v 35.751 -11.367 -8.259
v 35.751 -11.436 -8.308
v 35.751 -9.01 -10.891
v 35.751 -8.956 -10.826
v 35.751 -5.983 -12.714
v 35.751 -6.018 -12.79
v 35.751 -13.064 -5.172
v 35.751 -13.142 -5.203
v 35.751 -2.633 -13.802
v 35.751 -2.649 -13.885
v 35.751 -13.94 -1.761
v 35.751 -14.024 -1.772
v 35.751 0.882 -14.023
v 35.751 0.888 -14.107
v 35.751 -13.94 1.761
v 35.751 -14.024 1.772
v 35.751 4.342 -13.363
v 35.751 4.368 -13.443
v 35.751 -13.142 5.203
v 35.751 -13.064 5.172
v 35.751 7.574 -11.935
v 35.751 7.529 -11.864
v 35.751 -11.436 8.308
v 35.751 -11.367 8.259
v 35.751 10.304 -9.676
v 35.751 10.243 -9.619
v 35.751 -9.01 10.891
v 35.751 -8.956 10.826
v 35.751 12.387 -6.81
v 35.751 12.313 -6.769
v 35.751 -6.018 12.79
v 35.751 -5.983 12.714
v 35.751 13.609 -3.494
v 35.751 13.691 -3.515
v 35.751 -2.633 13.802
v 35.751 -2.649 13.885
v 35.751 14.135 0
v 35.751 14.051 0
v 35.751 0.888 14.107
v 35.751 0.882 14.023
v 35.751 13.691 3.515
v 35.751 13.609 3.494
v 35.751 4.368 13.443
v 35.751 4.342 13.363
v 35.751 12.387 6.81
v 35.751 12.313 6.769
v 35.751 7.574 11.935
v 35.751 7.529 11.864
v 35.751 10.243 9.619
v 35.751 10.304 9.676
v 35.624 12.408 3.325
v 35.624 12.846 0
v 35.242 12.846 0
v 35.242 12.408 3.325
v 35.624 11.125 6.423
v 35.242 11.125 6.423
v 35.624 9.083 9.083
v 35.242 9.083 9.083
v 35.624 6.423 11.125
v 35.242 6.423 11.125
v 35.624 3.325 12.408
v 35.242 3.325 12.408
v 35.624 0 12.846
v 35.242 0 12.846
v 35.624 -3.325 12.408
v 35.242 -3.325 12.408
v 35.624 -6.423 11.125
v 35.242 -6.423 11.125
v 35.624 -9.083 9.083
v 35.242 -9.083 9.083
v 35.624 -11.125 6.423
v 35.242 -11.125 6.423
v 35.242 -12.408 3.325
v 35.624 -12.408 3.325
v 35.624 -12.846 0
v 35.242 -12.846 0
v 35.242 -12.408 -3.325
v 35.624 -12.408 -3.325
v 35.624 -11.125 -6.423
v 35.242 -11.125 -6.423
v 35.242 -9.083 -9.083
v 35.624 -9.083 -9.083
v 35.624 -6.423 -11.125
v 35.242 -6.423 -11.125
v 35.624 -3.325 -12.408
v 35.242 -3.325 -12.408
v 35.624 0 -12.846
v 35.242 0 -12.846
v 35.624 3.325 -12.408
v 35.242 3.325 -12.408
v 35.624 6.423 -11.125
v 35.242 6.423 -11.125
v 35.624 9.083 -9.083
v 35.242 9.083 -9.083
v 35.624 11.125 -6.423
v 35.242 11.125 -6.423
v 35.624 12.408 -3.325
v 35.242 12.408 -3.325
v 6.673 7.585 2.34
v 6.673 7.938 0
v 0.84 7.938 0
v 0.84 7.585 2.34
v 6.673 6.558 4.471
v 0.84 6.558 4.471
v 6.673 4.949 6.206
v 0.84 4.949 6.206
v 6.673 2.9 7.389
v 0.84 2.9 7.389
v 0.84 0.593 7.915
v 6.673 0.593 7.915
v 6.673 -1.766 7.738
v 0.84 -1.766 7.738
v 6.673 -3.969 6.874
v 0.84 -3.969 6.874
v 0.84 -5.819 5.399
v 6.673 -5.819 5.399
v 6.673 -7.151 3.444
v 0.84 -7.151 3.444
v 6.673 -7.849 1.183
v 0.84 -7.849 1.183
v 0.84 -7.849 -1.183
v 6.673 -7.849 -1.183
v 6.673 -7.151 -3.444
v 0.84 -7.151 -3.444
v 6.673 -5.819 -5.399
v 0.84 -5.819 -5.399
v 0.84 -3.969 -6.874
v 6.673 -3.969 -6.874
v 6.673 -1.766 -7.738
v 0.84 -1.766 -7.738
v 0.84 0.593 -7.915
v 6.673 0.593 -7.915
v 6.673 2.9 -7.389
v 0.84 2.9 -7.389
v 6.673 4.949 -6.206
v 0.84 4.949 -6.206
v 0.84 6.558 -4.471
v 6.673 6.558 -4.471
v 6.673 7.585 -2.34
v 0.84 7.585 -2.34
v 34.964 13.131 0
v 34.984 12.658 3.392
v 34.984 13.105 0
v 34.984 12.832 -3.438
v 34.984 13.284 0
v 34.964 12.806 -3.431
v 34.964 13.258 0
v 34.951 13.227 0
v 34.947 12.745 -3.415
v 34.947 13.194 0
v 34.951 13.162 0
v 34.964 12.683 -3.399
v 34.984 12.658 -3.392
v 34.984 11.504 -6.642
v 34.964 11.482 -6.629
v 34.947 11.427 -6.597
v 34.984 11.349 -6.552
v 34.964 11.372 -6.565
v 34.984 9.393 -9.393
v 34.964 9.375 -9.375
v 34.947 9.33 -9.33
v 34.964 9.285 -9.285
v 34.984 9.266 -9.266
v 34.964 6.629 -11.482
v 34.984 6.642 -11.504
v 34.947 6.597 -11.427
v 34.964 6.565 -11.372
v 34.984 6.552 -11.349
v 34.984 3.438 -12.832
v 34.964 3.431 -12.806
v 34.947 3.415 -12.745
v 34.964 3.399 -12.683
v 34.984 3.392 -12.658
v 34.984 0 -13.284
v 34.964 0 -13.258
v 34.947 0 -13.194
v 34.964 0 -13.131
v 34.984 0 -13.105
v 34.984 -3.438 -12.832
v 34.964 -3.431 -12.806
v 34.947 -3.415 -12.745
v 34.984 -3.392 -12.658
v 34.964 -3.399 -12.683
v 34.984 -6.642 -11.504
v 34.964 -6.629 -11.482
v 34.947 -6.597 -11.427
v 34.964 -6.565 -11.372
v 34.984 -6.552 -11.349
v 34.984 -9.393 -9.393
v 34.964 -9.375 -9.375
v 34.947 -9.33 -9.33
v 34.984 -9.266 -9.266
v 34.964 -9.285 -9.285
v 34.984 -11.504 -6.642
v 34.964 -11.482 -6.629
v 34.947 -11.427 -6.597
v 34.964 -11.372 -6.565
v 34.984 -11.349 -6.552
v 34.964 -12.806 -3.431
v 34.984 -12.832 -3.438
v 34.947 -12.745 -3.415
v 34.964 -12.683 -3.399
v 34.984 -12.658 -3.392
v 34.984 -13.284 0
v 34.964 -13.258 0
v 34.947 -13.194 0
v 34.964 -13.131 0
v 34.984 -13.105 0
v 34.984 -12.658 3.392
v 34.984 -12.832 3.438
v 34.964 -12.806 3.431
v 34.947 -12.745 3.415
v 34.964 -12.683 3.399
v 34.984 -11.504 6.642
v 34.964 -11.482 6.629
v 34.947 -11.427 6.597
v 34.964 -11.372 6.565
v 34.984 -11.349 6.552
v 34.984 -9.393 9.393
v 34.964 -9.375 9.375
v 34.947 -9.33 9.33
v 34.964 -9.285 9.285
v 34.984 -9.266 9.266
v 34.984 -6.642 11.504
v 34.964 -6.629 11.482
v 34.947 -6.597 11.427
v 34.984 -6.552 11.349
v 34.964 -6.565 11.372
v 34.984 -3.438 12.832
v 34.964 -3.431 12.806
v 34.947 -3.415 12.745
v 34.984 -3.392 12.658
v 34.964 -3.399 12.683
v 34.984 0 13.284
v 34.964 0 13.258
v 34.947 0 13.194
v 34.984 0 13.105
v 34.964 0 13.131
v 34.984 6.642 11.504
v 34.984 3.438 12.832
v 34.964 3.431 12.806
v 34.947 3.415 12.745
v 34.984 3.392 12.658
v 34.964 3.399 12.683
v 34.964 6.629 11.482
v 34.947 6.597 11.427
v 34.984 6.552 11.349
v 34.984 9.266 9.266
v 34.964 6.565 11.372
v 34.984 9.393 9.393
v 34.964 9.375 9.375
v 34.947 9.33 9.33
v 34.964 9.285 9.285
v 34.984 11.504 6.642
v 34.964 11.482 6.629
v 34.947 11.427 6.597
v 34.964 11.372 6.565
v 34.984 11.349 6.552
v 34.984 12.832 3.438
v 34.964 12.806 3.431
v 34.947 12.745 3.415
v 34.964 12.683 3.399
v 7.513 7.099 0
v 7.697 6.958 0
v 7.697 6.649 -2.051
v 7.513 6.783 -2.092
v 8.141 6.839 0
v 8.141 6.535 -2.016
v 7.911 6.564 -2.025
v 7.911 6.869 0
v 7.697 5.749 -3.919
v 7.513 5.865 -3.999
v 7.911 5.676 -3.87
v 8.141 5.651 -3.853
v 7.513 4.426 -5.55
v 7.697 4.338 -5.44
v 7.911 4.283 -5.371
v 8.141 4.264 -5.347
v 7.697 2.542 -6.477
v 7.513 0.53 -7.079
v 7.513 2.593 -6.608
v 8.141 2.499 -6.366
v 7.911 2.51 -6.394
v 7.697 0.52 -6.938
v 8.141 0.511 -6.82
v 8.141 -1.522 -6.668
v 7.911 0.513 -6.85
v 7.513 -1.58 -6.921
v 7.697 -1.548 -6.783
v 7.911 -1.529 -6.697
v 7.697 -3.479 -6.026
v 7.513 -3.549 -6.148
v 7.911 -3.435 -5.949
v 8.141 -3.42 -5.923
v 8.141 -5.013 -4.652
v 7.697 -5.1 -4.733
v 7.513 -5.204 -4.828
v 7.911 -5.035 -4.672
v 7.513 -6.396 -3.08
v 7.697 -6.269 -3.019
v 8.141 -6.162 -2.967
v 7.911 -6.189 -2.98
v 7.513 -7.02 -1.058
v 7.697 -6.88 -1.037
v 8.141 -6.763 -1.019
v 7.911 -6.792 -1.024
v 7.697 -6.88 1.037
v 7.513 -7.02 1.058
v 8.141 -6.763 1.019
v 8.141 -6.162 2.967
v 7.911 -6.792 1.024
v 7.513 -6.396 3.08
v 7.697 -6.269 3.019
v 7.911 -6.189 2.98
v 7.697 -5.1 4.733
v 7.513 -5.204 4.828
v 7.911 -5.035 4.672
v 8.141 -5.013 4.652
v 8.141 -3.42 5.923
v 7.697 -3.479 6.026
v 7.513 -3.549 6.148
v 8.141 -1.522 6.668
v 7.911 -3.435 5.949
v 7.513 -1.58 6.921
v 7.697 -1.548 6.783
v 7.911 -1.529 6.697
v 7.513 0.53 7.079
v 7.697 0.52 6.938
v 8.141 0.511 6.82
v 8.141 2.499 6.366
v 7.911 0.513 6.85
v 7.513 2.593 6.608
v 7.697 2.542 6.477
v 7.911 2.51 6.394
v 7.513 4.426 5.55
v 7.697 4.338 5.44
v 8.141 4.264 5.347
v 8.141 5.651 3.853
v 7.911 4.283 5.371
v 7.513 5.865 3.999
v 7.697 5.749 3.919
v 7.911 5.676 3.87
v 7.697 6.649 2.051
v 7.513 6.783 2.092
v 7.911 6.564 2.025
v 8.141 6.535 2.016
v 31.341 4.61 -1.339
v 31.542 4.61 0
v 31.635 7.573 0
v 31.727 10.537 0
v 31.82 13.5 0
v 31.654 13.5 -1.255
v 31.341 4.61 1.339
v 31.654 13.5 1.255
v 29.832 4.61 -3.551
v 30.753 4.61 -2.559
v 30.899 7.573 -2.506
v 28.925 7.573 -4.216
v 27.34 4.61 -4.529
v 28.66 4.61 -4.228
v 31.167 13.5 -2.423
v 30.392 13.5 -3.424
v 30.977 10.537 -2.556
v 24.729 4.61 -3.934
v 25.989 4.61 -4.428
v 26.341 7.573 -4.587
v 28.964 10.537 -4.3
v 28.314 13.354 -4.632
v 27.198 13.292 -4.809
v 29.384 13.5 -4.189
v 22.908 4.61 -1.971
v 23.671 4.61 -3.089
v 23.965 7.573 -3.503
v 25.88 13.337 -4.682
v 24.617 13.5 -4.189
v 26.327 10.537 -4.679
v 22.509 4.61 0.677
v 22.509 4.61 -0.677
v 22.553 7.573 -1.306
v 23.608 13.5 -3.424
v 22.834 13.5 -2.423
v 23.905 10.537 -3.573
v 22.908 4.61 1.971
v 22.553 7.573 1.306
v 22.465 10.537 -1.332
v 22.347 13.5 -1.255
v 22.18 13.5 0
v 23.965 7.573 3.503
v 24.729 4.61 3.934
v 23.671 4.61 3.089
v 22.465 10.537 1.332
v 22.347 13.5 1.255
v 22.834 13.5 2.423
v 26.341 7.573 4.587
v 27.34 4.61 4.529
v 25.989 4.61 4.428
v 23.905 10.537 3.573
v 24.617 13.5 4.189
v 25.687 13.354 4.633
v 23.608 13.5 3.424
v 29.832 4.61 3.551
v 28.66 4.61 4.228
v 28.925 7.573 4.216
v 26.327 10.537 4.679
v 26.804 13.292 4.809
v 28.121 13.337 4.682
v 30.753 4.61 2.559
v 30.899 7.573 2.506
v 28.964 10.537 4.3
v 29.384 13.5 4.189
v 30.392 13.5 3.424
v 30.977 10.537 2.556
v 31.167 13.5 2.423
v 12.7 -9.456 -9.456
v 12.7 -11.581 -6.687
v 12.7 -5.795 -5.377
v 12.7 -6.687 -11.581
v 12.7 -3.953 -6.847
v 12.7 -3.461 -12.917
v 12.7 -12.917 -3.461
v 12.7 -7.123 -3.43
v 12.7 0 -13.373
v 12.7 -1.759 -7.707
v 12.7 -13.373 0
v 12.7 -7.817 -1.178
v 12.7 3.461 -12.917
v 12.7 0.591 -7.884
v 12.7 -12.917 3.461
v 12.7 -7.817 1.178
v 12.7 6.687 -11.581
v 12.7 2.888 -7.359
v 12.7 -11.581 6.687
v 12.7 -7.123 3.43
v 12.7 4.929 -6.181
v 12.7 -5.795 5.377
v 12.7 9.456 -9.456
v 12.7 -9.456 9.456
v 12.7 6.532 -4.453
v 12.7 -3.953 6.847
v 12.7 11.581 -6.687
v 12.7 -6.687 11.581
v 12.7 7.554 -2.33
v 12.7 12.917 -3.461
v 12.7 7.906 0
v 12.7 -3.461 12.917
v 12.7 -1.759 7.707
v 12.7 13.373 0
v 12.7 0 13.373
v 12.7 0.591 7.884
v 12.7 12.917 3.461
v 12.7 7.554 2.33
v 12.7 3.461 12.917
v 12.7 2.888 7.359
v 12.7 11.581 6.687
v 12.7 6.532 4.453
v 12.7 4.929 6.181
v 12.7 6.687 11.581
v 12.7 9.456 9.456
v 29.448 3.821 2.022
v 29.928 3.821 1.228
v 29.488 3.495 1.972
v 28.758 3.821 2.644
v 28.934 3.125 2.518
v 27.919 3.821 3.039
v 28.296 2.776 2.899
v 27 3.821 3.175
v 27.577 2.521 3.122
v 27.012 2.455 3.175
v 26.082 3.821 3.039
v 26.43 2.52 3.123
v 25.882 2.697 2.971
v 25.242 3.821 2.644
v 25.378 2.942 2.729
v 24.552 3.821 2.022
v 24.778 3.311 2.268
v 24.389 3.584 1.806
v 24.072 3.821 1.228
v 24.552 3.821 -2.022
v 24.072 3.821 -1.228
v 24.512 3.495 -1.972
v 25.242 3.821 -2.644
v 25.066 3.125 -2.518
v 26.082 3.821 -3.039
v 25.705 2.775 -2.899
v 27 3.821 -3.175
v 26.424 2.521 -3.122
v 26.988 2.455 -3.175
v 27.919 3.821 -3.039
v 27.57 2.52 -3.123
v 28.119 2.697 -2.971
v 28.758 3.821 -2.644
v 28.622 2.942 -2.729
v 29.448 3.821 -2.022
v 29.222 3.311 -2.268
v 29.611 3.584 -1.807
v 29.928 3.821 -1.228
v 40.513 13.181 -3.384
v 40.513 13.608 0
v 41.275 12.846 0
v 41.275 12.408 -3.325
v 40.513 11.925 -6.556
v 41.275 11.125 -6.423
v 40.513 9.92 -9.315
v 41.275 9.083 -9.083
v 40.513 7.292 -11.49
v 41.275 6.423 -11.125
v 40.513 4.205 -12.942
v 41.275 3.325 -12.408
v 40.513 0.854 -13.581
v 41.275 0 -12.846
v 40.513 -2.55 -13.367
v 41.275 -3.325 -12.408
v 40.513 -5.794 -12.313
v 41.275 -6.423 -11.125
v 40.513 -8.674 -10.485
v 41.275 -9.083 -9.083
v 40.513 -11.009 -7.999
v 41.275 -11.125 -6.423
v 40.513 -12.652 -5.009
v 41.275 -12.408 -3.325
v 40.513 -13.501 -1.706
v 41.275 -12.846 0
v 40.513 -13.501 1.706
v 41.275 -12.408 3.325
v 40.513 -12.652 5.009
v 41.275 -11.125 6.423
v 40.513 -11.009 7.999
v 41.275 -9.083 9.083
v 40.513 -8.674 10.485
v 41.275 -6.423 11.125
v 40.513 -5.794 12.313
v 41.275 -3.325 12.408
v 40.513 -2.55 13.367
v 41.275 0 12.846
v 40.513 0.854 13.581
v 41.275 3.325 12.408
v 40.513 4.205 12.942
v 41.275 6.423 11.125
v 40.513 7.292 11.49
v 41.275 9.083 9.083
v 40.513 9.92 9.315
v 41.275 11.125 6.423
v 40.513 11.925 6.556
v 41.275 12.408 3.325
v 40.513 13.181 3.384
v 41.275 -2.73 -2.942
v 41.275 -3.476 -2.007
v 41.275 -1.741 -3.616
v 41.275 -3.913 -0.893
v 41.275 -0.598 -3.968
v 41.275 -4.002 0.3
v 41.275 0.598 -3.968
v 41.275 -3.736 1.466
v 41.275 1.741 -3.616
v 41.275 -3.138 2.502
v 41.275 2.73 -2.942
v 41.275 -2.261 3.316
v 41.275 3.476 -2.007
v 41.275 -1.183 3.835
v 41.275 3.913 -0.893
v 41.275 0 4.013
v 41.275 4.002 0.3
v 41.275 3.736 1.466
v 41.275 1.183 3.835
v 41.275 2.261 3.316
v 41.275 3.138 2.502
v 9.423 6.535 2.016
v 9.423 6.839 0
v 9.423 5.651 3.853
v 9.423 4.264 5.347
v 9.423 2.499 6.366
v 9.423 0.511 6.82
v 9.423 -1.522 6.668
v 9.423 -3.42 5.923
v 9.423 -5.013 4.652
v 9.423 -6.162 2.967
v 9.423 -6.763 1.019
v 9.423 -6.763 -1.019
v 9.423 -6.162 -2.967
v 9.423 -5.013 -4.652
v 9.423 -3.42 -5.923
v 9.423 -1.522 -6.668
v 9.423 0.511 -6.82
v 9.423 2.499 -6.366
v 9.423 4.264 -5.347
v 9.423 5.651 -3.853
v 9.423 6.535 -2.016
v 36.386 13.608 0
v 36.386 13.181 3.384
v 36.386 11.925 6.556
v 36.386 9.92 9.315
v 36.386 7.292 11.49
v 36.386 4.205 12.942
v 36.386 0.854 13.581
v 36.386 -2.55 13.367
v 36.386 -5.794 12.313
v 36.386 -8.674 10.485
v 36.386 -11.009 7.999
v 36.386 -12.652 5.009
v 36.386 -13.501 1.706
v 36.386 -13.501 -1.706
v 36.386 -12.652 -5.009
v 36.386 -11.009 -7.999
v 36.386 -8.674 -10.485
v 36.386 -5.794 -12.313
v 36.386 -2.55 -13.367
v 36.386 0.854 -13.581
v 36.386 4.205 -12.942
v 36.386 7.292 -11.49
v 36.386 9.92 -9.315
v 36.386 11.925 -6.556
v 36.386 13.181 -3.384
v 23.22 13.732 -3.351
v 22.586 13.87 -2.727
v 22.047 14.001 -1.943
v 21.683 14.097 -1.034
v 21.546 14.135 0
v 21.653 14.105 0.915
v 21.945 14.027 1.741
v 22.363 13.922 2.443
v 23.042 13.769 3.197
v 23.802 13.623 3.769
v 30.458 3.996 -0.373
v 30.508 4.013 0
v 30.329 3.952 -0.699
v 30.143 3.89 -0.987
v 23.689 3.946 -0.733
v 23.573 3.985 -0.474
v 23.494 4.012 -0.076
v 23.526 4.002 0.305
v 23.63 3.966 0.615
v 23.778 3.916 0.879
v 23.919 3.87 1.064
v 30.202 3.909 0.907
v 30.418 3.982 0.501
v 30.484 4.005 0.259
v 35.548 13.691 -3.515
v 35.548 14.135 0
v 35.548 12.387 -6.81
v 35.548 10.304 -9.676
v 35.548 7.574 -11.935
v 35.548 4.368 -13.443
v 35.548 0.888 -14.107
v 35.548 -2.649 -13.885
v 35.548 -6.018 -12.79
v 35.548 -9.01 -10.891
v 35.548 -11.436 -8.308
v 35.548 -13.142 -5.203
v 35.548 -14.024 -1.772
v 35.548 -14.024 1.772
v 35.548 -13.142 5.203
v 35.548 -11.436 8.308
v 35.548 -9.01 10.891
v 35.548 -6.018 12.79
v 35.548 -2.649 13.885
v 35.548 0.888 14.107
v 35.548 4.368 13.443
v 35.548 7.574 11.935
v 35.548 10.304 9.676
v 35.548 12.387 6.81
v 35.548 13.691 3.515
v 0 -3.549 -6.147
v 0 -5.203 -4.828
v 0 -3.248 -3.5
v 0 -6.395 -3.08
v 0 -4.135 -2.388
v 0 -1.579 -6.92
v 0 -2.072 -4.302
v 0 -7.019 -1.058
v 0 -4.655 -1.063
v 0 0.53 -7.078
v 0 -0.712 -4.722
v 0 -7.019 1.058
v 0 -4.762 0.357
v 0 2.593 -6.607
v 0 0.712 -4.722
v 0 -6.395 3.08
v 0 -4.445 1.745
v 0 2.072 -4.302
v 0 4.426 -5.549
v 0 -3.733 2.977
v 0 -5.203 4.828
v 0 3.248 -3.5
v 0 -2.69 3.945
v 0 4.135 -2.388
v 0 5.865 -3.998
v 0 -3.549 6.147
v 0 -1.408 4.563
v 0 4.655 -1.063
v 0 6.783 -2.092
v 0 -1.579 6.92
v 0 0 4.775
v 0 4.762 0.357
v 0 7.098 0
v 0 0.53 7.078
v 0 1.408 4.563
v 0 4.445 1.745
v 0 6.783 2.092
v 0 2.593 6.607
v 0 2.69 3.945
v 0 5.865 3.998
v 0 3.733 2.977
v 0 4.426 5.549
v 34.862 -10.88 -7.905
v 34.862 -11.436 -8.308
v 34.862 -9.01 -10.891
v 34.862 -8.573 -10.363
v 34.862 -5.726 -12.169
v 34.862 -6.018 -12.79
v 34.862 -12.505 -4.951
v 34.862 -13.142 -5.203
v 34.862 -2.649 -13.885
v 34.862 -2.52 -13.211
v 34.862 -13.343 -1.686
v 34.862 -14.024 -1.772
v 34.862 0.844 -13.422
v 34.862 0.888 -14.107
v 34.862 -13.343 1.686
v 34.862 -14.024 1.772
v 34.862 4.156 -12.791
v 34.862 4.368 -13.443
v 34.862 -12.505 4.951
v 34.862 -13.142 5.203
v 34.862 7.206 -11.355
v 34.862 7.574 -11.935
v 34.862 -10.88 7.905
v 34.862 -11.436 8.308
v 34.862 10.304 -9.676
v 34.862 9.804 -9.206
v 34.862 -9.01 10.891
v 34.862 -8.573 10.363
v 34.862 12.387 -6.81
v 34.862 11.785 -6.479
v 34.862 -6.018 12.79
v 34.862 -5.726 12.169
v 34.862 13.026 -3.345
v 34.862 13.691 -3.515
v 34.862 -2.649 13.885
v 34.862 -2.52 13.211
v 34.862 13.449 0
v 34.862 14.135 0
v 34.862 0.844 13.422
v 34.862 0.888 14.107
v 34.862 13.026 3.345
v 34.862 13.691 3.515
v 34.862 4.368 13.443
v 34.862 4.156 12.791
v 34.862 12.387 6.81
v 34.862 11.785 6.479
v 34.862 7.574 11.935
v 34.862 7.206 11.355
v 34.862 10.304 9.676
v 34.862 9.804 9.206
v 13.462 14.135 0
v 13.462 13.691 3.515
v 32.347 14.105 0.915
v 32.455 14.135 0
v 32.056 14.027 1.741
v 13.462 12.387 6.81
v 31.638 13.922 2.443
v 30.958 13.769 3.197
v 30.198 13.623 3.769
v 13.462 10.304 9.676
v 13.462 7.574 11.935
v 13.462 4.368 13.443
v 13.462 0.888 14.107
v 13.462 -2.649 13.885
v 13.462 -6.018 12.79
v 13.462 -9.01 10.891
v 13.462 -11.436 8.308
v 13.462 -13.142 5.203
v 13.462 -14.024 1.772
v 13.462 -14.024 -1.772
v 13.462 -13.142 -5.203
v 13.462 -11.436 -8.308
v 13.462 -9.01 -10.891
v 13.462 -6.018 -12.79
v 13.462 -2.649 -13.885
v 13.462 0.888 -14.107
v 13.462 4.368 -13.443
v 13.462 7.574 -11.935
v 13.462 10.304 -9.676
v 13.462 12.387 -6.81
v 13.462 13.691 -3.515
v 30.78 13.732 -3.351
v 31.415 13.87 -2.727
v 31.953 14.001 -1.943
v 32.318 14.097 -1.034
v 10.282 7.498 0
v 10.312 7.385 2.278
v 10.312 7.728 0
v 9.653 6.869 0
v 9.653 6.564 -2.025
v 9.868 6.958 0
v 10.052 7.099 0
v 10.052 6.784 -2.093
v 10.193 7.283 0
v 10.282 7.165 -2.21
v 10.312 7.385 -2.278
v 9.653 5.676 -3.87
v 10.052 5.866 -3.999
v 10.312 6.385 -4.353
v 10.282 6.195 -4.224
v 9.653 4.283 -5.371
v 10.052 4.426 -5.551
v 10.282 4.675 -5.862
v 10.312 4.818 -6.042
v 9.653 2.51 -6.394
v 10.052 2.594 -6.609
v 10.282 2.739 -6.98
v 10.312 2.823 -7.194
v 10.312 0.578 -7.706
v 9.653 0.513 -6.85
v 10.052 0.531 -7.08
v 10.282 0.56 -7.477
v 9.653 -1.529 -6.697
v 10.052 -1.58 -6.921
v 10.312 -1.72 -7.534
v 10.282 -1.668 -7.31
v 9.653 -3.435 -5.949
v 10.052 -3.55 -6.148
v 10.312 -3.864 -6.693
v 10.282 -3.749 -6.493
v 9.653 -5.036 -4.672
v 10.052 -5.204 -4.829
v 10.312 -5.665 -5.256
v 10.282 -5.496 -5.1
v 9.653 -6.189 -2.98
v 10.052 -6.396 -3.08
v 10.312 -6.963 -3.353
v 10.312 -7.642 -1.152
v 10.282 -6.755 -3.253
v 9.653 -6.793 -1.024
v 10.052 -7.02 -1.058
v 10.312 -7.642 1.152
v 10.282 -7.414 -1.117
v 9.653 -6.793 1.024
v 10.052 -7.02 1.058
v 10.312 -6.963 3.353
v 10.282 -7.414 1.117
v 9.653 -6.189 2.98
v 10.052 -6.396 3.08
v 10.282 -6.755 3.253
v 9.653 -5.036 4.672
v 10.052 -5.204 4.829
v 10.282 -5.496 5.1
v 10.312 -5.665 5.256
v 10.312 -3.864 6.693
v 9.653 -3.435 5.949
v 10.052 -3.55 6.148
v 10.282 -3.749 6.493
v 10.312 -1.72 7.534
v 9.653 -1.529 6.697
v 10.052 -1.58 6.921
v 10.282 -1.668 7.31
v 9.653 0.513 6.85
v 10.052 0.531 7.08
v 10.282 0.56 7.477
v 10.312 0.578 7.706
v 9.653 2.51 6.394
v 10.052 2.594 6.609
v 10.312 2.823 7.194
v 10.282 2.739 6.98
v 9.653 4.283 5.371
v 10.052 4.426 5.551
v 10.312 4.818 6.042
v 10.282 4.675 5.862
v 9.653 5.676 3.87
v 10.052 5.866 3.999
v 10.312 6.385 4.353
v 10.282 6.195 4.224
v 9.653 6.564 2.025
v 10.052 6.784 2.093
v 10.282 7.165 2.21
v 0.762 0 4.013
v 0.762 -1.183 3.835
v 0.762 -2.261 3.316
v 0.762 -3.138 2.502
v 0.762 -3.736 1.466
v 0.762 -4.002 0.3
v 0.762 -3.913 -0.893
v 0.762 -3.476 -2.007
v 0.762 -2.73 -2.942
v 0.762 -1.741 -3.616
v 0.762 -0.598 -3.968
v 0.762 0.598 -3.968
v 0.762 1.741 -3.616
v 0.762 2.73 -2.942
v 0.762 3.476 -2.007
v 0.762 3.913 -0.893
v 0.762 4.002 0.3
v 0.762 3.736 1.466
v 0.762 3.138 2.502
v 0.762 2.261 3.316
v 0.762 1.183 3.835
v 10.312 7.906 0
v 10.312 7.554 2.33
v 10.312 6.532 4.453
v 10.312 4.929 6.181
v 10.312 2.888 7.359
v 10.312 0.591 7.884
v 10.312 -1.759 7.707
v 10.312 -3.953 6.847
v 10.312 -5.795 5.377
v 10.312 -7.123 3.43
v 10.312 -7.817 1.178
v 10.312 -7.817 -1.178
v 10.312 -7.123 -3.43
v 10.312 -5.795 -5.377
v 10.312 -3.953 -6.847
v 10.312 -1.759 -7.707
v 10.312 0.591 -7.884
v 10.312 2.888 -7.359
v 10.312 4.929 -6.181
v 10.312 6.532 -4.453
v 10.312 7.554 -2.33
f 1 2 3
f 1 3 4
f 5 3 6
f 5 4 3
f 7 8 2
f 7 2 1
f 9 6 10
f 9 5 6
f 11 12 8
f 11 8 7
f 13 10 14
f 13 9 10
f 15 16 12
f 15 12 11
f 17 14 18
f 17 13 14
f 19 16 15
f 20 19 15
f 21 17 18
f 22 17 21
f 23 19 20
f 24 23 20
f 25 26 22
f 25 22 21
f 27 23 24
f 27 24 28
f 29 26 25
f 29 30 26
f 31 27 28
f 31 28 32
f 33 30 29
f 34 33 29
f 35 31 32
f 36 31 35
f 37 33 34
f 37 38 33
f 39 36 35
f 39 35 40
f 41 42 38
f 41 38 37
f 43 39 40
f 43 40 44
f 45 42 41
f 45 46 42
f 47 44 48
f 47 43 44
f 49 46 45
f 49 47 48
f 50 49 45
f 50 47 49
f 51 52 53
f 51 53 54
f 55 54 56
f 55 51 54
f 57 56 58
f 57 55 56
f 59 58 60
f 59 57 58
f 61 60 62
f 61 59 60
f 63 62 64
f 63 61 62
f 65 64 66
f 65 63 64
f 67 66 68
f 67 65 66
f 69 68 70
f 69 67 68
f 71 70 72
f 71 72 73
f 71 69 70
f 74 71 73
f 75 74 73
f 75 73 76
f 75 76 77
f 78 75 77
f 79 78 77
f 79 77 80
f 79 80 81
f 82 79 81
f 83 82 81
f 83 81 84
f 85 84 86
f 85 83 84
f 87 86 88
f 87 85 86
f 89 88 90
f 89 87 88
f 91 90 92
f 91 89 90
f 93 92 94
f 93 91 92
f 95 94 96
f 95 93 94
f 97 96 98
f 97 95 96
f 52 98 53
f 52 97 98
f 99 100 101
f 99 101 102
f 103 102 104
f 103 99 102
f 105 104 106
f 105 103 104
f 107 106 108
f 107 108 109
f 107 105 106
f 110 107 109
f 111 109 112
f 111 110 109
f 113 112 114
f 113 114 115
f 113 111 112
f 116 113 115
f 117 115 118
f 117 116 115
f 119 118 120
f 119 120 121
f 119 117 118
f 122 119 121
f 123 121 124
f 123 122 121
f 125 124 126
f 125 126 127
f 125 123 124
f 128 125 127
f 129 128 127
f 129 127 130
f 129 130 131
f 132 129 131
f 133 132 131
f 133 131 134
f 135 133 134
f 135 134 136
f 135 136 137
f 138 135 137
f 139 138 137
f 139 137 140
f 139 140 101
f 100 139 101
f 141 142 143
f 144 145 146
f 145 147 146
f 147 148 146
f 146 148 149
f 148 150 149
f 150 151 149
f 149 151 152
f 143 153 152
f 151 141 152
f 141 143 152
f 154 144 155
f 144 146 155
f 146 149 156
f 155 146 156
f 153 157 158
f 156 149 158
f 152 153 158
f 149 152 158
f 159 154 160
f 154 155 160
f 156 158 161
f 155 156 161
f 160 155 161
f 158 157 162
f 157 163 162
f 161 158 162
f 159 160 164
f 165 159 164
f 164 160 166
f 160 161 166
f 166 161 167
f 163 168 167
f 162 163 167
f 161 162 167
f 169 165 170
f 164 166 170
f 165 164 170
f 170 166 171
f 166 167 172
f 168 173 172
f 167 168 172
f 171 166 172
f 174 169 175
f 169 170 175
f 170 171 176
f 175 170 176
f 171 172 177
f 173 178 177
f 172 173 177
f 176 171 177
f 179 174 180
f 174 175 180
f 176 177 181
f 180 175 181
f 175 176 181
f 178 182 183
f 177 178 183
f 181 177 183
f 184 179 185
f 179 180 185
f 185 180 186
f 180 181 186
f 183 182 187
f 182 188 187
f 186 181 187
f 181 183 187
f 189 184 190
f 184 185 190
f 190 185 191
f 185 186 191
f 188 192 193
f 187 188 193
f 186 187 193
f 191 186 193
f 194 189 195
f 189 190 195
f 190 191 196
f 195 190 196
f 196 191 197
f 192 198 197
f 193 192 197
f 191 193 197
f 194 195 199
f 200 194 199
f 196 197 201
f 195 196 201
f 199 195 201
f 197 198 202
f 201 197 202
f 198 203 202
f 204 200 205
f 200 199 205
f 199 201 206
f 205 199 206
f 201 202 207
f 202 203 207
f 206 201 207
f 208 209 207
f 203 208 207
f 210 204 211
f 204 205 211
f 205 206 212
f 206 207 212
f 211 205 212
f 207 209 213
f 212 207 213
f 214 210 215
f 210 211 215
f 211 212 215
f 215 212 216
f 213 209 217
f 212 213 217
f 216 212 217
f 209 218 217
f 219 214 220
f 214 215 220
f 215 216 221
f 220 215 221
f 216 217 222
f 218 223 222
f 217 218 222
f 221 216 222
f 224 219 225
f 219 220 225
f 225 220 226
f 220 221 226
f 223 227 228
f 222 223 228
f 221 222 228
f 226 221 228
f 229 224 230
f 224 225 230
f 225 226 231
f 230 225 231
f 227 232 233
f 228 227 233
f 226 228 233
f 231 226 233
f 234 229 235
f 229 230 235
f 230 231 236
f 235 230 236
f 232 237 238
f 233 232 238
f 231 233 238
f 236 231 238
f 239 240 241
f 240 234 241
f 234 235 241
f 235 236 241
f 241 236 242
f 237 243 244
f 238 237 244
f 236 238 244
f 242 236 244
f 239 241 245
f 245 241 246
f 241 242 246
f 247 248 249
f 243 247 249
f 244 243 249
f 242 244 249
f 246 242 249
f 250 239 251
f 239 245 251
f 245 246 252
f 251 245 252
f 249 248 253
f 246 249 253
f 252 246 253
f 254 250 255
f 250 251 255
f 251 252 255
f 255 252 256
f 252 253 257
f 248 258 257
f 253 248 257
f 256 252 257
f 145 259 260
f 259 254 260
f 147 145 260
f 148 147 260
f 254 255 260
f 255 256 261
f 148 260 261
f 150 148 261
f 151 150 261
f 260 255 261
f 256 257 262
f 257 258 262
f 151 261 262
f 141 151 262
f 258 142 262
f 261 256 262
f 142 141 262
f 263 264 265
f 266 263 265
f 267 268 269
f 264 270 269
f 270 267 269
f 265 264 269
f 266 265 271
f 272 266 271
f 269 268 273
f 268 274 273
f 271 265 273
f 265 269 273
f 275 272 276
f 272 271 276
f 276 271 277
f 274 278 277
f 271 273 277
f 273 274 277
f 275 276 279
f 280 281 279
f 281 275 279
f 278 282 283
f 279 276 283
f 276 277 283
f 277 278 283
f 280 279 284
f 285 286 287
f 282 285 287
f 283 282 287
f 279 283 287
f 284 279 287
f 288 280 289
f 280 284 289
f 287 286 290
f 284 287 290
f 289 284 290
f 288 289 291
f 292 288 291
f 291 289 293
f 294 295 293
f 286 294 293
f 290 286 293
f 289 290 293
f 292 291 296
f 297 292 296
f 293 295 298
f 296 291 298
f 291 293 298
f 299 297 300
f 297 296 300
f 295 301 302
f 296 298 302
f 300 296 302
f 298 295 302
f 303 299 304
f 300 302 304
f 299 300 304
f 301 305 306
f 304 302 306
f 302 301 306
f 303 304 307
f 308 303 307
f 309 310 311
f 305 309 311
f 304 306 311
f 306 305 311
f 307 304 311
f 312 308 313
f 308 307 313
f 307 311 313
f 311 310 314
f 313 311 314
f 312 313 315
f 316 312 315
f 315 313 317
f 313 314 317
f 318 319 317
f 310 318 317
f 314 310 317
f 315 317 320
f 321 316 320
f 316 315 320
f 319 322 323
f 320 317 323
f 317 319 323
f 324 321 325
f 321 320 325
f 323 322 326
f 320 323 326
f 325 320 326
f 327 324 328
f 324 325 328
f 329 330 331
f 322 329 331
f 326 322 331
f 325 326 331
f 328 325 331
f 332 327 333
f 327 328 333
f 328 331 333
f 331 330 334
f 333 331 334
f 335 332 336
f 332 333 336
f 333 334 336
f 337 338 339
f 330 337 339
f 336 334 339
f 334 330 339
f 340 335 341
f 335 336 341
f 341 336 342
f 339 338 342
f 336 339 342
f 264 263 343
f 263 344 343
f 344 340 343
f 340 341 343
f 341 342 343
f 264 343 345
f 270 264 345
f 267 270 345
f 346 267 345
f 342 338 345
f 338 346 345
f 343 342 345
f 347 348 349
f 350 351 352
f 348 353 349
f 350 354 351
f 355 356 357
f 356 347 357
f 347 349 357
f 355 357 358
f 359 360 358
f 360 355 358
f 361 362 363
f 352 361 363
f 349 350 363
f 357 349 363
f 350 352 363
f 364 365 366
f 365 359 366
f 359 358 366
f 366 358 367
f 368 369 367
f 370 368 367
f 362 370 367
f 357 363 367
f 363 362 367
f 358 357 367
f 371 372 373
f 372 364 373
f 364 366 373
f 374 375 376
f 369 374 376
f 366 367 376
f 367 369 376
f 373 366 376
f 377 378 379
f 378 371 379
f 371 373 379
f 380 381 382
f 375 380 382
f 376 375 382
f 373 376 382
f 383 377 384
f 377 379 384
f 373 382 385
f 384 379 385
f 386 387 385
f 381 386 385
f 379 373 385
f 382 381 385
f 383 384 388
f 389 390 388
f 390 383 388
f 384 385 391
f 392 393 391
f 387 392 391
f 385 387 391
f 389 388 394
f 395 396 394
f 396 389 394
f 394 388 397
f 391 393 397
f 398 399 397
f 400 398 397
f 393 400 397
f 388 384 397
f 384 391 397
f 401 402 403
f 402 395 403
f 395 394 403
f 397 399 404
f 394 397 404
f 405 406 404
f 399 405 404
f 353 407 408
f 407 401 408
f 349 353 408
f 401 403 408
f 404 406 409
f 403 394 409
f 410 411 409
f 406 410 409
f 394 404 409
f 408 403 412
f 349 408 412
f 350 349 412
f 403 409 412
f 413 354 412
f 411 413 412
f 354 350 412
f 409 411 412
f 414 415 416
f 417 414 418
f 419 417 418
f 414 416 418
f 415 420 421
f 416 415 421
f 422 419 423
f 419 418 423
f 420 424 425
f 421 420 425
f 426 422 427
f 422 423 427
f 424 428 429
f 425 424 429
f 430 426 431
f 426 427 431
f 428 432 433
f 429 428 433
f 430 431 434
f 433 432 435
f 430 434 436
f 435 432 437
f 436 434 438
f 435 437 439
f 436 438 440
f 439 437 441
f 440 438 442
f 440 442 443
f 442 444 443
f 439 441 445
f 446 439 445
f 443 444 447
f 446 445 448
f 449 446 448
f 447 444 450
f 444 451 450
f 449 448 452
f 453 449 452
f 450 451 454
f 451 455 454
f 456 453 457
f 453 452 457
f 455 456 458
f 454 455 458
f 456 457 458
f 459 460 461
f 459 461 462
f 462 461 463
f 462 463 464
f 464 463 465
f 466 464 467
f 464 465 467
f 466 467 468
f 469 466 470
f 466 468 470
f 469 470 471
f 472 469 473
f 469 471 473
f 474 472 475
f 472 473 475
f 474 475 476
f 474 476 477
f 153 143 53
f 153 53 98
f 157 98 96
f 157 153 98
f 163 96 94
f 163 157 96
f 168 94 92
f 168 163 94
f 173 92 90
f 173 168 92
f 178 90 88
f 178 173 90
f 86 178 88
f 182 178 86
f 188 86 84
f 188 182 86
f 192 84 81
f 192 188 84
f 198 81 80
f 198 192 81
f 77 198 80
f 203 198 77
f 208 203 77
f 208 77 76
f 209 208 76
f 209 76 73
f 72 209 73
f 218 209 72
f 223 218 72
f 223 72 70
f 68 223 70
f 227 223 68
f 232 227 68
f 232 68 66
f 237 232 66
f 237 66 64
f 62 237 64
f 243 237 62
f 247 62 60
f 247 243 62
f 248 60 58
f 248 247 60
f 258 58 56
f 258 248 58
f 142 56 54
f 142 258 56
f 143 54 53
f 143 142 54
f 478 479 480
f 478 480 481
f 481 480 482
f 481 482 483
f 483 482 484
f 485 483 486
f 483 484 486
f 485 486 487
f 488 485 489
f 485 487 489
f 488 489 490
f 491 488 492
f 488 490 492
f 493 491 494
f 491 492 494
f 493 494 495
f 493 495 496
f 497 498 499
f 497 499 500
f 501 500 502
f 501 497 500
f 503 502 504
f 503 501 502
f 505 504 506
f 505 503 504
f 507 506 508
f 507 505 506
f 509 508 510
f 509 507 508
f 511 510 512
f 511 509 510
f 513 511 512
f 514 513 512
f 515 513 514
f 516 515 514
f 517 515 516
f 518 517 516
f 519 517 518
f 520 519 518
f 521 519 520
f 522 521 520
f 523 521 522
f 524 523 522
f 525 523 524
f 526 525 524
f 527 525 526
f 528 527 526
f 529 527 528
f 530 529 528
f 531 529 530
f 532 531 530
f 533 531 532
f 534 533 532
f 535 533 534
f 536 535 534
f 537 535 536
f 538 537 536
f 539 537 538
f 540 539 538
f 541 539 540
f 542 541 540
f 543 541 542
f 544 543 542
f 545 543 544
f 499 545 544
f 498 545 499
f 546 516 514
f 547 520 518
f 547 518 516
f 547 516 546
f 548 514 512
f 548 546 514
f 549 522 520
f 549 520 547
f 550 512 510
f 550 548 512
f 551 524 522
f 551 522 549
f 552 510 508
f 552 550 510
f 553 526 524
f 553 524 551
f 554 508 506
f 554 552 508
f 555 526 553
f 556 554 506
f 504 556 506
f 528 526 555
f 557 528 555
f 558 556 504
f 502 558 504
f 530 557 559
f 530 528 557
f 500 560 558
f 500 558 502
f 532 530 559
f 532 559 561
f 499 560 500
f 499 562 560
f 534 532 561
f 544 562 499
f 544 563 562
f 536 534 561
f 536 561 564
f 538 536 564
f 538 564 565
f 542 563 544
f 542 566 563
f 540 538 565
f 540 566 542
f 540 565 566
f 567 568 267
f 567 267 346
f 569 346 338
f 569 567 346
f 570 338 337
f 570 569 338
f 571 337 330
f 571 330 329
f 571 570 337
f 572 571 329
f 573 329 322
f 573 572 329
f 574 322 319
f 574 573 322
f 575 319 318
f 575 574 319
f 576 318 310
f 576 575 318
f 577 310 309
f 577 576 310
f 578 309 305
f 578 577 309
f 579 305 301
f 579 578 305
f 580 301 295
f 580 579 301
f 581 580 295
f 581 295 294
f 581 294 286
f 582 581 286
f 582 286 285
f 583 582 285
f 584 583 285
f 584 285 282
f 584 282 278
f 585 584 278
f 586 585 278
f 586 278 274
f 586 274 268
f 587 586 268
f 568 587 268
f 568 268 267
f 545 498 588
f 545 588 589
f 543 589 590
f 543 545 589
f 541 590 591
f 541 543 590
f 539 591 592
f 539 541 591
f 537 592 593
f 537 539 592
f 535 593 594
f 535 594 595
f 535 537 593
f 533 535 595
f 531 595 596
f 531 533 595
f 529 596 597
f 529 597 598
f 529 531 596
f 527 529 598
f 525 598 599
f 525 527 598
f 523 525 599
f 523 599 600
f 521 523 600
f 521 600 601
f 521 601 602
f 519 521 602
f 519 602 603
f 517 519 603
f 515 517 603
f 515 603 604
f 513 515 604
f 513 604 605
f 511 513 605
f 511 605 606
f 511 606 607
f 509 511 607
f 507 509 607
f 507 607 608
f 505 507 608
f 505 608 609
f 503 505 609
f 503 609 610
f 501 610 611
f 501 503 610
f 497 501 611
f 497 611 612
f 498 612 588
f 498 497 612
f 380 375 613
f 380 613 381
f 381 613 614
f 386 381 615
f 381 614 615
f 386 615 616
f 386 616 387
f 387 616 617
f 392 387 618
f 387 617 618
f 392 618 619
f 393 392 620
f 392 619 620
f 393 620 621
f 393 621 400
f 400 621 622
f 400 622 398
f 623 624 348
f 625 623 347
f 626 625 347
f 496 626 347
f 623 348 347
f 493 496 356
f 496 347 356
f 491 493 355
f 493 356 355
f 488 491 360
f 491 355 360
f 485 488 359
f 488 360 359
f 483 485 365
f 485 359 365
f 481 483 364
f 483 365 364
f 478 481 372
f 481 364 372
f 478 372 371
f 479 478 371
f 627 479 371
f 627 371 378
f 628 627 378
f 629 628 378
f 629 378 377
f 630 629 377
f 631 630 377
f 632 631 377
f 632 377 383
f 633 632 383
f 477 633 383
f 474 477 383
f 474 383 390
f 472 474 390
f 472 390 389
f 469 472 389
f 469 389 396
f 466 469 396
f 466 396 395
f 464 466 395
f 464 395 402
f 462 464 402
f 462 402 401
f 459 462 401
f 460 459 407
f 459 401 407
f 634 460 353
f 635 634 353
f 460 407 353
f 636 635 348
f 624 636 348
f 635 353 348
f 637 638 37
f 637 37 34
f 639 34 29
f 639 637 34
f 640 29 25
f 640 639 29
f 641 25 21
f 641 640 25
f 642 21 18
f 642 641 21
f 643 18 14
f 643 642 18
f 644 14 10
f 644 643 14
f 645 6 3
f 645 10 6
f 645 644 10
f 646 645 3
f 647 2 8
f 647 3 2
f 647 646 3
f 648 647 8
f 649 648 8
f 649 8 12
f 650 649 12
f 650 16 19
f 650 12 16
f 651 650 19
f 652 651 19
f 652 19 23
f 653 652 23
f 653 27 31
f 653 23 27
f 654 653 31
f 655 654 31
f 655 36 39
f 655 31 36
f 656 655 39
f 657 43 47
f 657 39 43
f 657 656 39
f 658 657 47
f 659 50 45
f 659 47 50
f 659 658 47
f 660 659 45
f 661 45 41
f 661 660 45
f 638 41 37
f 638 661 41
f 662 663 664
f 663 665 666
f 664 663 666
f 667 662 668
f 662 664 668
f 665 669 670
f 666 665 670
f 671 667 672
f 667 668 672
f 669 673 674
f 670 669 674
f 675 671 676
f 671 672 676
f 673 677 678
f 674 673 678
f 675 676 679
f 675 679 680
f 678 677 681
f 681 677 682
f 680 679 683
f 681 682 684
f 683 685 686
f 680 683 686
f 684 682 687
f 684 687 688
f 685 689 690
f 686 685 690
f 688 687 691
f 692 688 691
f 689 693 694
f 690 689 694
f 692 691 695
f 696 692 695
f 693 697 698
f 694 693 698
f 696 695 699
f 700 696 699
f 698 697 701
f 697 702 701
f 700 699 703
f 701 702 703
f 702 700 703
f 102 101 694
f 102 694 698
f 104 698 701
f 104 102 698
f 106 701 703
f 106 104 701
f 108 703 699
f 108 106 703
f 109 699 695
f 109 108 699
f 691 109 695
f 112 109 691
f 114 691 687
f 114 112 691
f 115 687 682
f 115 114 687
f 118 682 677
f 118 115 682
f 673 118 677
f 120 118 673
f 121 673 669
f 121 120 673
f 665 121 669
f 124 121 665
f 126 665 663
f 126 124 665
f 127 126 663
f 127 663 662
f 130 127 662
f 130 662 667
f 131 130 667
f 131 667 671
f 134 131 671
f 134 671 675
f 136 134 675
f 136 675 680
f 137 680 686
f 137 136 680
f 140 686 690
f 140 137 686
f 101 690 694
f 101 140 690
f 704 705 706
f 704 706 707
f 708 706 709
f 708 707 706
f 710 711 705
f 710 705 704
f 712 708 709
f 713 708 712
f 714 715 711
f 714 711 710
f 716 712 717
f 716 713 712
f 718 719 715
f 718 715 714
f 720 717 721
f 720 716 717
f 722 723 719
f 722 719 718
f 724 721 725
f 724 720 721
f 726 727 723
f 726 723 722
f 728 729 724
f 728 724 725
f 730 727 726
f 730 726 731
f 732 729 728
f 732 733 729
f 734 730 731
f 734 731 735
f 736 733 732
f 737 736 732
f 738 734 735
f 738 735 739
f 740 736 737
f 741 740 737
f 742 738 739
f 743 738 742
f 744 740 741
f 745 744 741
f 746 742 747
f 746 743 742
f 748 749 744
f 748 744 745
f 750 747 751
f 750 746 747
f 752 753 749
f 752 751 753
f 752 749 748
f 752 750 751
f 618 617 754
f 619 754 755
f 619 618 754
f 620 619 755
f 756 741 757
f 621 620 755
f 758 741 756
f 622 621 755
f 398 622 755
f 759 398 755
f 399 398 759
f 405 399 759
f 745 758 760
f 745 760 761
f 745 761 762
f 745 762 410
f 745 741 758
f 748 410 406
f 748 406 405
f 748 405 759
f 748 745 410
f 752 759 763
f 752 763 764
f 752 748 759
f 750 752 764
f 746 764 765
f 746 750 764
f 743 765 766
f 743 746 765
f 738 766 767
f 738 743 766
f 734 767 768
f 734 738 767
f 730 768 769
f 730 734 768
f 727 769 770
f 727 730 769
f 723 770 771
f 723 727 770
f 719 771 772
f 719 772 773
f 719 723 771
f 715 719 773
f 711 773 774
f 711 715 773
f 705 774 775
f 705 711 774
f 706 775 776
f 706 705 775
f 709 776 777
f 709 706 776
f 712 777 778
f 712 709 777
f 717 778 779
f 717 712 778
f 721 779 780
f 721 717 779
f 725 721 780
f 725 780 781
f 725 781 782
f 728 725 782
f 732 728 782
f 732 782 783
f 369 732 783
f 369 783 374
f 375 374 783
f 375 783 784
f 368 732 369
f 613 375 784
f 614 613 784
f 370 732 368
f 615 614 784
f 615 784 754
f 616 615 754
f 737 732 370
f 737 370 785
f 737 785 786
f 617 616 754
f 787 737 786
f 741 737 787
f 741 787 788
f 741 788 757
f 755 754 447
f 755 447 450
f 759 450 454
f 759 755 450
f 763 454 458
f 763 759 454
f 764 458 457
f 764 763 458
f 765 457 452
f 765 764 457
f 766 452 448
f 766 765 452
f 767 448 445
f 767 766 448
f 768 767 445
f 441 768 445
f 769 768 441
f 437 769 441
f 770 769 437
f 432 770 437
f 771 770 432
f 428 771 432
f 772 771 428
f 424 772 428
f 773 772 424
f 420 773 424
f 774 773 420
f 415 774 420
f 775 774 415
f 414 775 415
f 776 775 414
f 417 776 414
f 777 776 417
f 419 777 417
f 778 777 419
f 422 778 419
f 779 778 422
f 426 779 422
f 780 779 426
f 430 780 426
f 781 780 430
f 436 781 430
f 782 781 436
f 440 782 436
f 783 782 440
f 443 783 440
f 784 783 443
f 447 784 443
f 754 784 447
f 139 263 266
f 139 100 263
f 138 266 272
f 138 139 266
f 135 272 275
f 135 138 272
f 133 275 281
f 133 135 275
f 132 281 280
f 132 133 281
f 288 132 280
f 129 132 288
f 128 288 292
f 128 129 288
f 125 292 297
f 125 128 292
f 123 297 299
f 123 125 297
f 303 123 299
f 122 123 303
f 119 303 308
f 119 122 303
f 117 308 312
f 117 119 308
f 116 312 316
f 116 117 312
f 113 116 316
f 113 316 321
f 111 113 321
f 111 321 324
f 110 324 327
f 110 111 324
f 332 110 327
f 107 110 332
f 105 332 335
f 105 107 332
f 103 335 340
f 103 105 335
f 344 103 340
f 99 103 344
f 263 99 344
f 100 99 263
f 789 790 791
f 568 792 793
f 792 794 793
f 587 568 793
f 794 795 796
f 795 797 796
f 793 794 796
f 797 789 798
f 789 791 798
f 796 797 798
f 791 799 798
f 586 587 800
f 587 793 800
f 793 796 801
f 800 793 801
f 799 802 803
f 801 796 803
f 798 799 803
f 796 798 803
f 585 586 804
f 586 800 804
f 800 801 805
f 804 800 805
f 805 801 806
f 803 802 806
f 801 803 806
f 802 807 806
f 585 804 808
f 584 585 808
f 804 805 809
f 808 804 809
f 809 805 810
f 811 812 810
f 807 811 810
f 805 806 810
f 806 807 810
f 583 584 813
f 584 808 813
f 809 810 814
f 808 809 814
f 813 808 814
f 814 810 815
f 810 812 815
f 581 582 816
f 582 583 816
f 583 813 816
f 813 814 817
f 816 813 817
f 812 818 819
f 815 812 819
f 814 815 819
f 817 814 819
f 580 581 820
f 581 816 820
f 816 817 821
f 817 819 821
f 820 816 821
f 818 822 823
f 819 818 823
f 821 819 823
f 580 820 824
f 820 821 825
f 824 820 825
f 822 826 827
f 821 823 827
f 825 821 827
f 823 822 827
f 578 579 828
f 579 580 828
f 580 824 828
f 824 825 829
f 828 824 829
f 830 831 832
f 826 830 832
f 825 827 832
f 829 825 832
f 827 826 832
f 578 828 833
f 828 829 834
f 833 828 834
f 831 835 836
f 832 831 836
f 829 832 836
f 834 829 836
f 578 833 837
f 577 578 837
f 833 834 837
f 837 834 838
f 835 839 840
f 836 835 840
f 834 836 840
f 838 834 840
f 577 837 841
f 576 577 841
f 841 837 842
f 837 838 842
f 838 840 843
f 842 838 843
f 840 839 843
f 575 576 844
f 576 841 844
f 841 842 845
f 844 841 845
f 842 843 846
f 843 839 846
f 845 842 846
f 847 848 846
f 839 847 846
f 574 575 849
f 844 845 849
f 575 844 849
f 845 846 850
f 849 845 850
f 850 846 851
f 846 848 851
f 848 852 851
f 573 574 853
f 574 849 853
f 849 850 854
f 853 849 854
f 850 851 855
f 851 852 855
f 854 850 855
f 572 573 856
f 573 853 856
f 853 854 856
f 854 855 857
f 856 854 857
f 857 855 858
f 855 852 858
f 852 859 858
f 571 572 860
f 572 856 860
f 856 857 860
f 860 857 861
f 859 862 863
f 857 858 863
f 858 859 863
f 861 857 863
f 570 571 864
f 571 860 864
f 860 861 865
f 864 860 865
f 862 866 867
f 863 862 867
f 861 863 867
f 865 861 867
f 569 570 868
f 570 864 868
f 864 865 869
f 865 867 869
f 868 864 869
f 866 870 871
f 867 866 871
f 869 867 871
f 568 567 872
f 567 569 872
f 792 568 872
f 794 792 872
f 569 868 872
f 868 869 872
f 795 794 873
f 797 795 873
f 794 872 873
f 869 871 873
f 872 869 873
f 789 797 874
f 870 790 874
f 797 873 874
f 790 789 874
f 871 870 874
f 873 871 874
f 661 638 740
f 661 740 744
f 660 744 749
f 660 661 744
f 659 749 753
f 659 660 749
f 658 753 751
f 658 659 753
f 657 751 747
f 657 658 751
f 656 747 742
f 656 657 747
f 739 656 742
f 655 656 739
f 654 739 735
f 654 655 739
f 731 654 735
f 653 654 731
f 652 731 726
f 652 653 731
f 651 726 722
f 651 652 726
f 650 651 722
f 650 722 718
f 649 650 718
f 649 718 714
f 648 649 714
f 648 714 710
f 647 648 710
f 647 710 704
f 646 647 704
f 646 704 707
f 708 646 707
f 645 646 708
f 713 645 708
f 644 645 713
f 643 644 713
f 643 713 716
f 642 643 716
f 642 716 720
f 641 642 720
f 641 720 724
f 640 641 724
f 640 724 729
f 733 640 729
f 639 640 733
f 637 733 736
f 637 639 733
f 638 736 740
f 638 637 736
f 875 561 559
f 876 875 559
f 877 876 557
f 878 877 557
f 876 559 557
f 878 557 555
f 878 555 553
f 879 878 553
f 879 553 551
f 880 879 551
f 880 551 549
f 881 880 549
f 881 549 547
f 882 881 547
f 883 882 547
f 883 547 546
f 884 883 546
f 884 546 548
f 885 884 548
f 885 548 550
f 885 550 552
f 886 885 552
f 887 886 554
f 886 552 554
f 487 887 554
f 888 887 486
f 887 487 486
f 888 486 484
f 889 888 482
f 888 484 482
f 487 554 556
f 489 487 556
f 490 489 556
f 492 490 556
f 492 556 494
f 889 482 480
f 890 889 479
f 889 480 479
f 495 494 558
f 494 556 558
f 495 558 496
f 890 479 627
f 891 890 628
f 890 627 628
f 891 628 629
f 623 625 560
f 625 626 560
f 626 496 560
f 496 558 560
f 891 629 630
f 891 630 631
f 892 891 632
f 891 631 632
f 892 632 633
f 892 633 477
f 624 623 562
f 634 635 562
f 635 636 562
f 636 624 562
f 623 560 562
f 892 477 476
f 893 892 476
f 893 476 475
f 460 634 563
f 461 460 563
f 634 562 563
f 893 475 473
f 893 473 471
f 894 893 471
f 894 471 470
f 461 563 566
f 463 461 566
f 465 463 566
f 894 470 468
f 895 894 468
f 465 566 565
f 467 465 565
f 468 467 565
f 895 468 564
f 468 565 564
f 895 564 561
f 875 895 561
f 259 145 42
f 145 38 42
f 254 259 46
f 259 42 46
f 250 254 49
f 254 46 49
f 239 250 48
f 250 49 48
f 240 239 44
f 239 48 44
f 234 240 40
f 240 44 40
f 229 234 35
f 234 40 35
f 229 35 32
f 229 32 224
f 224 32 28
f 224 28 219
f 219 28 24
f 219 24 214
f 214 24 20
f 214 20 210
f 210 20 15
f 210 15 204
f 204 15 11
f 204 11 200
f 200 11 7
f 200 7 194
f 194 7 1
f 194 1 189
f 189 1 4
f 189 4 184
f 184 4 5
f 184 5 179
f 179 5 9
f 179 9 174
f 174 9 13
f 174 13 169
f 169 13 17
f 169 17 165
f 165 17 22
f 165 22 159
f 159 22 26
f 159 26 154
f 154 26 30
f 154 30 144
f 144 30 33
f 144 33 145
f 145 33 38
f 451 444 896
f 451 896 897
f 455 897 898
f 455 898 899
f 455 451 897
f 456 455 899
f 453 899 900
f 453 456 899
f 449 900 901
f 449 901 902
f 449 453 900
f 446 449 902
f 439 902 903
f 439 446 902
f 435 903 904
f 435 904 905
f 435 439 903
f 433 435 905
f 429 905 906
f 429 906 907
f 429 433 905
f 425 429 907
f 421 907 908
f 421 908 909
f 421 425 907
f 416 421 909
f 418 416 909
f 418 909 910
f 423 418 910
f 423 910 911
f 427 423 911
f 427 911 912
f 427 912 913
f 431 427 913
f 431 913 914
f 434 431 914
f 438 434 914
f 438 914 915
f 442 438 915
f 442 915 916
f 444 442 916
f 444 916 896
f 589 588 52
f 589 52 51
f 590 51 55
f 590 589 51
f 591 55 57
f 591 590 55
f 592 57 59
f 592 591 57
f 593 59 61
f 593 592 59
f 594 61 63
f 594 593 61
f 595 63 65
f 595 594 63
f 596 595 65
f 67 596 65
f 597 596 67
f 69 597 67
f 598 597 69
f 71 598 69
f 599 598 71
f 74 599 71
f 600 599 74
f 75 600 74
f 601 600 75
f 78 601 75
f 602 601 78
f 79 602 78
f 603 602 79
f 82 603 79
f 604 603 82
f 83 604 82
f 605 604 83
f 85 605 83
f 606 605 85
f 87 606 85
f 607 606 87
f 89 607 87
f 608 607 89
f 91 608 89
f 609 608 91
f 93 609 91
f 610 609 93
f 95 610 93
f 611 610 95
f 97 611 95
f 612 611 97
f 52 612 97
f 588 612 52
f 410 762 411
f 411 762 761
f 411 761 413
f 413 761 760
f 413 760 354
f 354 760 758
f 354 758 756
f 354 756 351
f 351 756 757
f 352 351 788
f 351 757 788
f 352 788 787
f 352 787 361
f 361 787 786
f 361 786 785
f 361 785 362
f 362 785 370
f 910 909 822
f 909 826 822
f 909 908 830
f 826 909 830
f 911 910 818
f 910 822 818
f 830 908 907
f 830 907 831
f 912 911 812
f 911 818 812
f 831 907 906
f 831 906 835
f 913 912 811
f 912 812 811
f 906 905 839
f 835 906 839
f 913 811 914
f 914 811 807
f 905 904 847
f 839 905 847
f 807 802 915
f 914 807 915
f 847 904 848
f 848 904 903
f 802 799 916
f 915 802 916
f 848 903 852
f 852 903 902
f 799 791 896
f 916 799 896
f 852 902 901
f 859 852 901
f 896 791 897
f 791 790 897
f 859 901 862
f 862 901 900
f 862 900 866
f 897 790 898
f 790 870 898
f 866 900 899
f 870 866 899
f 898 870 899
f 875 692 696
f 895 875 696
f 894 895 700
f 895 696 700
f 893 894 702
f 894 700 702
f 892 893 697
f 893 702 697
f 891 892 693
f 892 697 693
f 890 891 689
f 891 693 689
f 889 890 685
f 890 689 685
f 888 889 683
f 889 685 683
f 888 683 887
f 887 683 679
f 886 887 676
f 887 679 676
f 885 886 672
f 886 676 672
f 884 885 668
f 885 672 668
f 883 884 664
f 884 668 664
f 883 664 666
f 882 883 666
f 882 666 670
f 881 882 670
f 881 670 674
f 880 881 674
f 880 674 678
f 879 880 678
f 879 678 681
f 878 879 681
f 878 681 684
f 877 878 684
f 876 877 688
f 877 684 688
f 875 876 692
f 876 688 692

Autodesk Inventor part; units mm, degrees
sketch "Sketch_2" plane through (0, 0, 0) normal (0, 0, 1) x (1, 0, 0)
  line L0 (12.7, 0) -> (0, 0)
  line L1 (0, 0) -> (0, 7.098)
  line L2 (0, 7.098) -> (0.8395, 7.9375)
  line L3 (0.8395, 7.9375) -> (6.6726, 7.9375)
  line L4 (6.6726, 7.9375) -> (7.5126, 7.0988)
  arc A0 (7.5126, 7.0988) -> (8.1407, 6.839) centre (8.1407, 7.728) ccw
  line L5 (8.1407, 6.839) -> (9.4234, 6.839)
  arc A1 (9.4234, 6.839) -> (10.3124, 7.7279) centre (9.4234, 7.7279) ccw
  line L6 (10.3124, 7.7279) -> (10.3124, 7.9057)
  line L7 (10.3124, 7.9057) -> (12.7, 7.9057)
  line L8 (12.7, 7.9057) -> (12.7, 0)
  line L9 (12.7, 0) -> (0, 0)
revolve "Revolution1" add sketch "Sketch_2" angle 360 about axis through (12.7, 0, 0) along (1, 0, 0)
thread "Thread1" size "5/8-18 UNF" class "2A" standard "ANSI Unified Screw Threads" full length
sketch "Sketch_3" plane through (0, 0, 0) normal (0, 0, 1) x (1, 0, 0)
  line L0 (41.275, 0) -> (12.7, 0)
  line L1 (12.7, 0) -> (12.7, 13.3731)
  line L2 (12.7, 13.3731) -> (13.462, 14.1351)
  line L3 (13.462, 14.1351) -> (34.8615, 14.1351)
  line L4 (34.8615, 14.1351) -> (34.8615, 12.846)
  line L5 (34.8615, 12.846) -> (35.6235, 12.846)
  line L6 (35.6235, 12.846) -> (36.3855, 13.6081)
  line L7 (36.3855, 13.6081) -> (40.513, 13.6081)
  line L8 (40.513, 13.6081) -> (41.275, 12.846)
  line L9 (41.275, 12.846) -> (41.275, 0)
  line L10 (41.275, 0) -> (12.7, 0)
revolve "Revolution2" add sketch "Sketch_3" angle 360 about axis through (41.275, 0, 0) along (1, 0, 0)
sketch "Sketch3" plane through (0, 0, 0) normal (-1, 0, 0) x (0, 0, 1)
  point P0 (0, 0)
hole "Hole1" at (0, 0, 0) direction (1, 0, 0) diameter 8.0264 depth 41.275 countersink diameter 9.5504 countersink angle 90
sketch "Sketch_43" plane through (0, 0, 0) normal (0, 0, 1) x (1, 0, 0)
  line L0 (27.0002, 0) -> (27.0002, 14.1351)
  line L1 (27.0002, 14.1351) -> (32.4549, 14.1351)
  line L2 (32.4549, 14.1351) -> (31.8199, 13.5001)
  line L3 (31.8199, 13.5001) -> (31.5423, 4.6101)
  line L4 (31.5423, 4.6101) -> (30.1752, 3.8208)
  line L5 (30.1752, 3.8208) -> (30.1752, 0)
  line L6 (30.1752, 0) -> (27.0002, 0)
  line L7 (27.0002, 0) -> (27.0002, 14.1351)
revolve "Revolution3" cut sketch "Sketch_43" angle 360 about axis through (27.0002, 0, 0) along (0, -1, 0)
thread "Thread2" size "1/8" designation "1/8 - 27 NPT" standard "NPT" length 5.0825
sketch "Sketch_47" plane through (0, 0, 0) normal (0, 0, 1) x (1, 0, 0)
  line L0 (35.6235, 0) -> (34.8615, 0)
  line L1 (34.8615, 13.449) -> (34.8615, 12.5921)
  line L2 (34.8615, 12.5921) -> (35.6235, 12.5921)
  line L3 (35.6235, 12.5921) -> (35.6235, 12.846)
  line L4 (35.6235, 12.846) -> (35.2425, 12.846)
  line L5 (35.2425, 12.846) -> (34.984, 13.1046)
  arc A0 (34.984, 13.2842) -> (34.984, 13.1046) centre (35.0738, 13.1944) ccw
  line L6 (34.984, 13.2842) -> (35.7508, 14.0509)
  line L7 (35.7508, 14.0509) -> (35.7508, 14.1351)
  line L8 (35.7508, 14.1351) -> (35.5476, 14.1351)
  line L9 (35.5476, 14.1351) -> (34.8615, 13.449)
revolve "Revolution4" add sketch "Sketch_47" angle 360 about axis through (35.6235, 0, 0) along (1, 0, 0)
ref_plane "dp1_XY" through (12.7, 7.9057, 0) normal (0, 0, 1) x (1, 0, 0)
ref_plane "dp1_YZ" through (12.7, 7.9057, 0) normal (1, 0, 0) x (0, 1, 0)
ref_plane "dp1_ZX" through (12.7, 7.9057, 0) normal (0, 1, 0) x (0, 0, 1)
ref_plane "dp2_XY" through (12.7, -7.9057, 0) normal (0, 0, 1) x (1, 0, 0)
ref_plane "dp2_YZ" through (12.7, -7.9057, 0) normal (1, 0, 0) x (0, 1, 0)
ref_plane "dp2_ZX" through (12.7, -7.9057, 0) normal (0, 1, 0) x (0, 0, 1)
ref_plane "hh_XY" through (0, 7.9375, 0) normal (0, 0, 1) x (1, 0, 0)
ref_plane "hh_YZ" through (0, 7.9375, 0) normal (1, 0, 0) x (0, 1, 0)
ref_plane "hh_ZX" through (0, 7.9375, 0) normal (0, 1, 0) x (0, 0, 1)
ref_plane "port_XY" through (27.0002, 14.1351, 0) normal (0, 0, 1) x (1, 0, 0)
ref_plane "port_YZ" through (27.0002, 14.1351, 0) normal (1, 0, 0) x (0, 1, 0)
ref_plane "port_ZX" through (27.0002, 14.1351, 0) normal (0, 1, 0) x (0, 0, 1)
ref_plane "rod_guide_XY" through (0, 0, 0) normal (1, 0, 0) x (0, 0, -1)
ref_plane "rod_guide_YZ" through (0, 0, 0) normal (0, 0, -1) x (0, 1, 0)
ref_plane "rod_guide_ZX" through (0, 0, 0) normal (0, 1, 0) x (1, 0, 0)
ref_plane "s1_XY" through (10.3124, 0, 0) normal (0, 0, 1) x (1, 0, 0)
ref_plane "s1_YZ" through (10.3124, 0, 0) normal (1, 0, 0) x (0, 1, 0)
ref_plane "s1_ZX" through (10.3124, 0, 0) normal (0, 1, 0) x (0, 0, 1)
ref_plane "s2_XY" through (12.7, 0, 0) normal (0, 0, 1) x (1, 0, 0)
ref_plane "s2_YZ" through (12.7, 0, 0) normal (1, 0, 0) x (0, 1, 0)
ref_plane "s2_ZX" through (12.7, 0, 0) normal (0, 1, 0) x (0, 0, 1)
ref_plane "t1_XY" through (12.7, 0, 0) normal (1, 0, 0) x (0, 0, -1)
ref_plane "t1_YZ" through (12.7, 0, 0) normal (0, 0, -1) x (0, 1, 0)
ref_plane "t1_ZX" through (12.7, 0, 0) normal (0, 1, 0) x (1, 0, 0)
ref_plane "t111_XY" through (12.7, 0, 0) normal (1, 0, 0) x (0, 0, -1)
ref_plane "t111_YZ" through (12.7, 0, 0) normal (0, 0, -1) x (0, 1, 0)
ref_plane "t111_ZX" through (12.7, 0, 0) normal (0, 1, 0) x (1, 0, 0)
ref_plane "to_foot_bracket_XY" through (12.7, 0, 0) normal (1, 0, 0) x (0, 0, -1)
ref_plane "to_foot_bracket_YZ" through (12.7, 0, 0) normal (0, 0, -1) x (0, 1, 0)
ref_plane "to_foot_bracket_ZX" through (12.7, 0, 0) normal (0, 1, 0) x (1, 0, 0)
ref_plane "to_nut_XY" through (10.3124, 0, 0) normal (1, 0, 0) x (0, 0, -1)
ref_plane "to_nut_YZ" through (10.3124, 0, 0) normal (0, 0, -1) x (0, 1, 0)
ref_plane "to_nut_ZX" through (10.3124, 0, 0) normal (0, 1, 0) x (1, 0, 0)
ref_plane "to_rod_XY" through (0, 0, 0) normal (1, 0, 0) x (0, 0, -1)
ref_plane "to_rod_YZ" through (0, 0, 0) normal (0, 0, -1) x (0, 1, 0)
ref_plane "to_rod_ZX" through (0, 0, 0) normal (0, 1, 0) x (1, 0, 0)
ref_plane "to_screw_XY" through (27.0002, -7.0485, -10.2743) normal (0, 0, -1) x (1, 0, 0)
ref_plane "to_screw_YZ" through (27.0002, -7.0485, -10.2743) normal (1, 0, 0) x (0, -1, 0)
ref_plane "to_screw_ZX" through (27.0002, -7.0485, -10.2743) normal (0, -1, 0) x (0, 0, -1)
ref_plane "to_trunnion_brackets_XY" through (18.2118, 0, 0) normal (0, 1, 0) x (1, 0, 0)
ref_plane "to_trunnion_brackets_YZ" through (18.2118, 0, 0) normal (1, 0, 0) x (0, 0, -1)
ref_plane "to_trunnion_brackets_ZX" through (18.2118, 0, 0) normal (0, 0, -1) x (0, 1, 0)
ref_plane "to_trunnion_brackets1_XY" through (18.2118, 15.875, 0) normal (0, 1, 0) x (1, 0, 0)
ref_plane "to_trunnion_brackets1_YZ" through (18.2118, 15.875, 0) normal (1, 0, 0) x (0, 0, -1)
ref_plane "to_trunnion_brackets1_ZX" through (18.2118, 15.875, 0) normal (0, 0, -1) x (0, 1, 0)
ref_plane "to_trunnion_brackets2_XY" through (18.2118, -15.875, 0) normal (0, 1, 0) x (1, 0, 0)
ref_plane "to_trunnion_brackets2_YZ" through (18.2118, -15.875, 0) normal (1, 0, 0) x (0, 0, -1)
ref_plane "to_trunnion_brackets2_ZX" through (18.2118, -15.875, 0) normal (0, 0, -1) x (0, 1, 0)
ref_plane "to_tube_XY" through (35.6235, 0, 0) normal (1, 0, 0) x (0, 0, -1)
ref_plane "to_tube_YZ" through (35.6235, 0, 0) normal (0, 0, -1) x (0, 1, 0)
ref_plane "to_tube_ZX" through (35.6235, 0, 0) normal (0, 1, 0) x (1, 0, 0)
properties part number "09RK000-0_rod_guide"
